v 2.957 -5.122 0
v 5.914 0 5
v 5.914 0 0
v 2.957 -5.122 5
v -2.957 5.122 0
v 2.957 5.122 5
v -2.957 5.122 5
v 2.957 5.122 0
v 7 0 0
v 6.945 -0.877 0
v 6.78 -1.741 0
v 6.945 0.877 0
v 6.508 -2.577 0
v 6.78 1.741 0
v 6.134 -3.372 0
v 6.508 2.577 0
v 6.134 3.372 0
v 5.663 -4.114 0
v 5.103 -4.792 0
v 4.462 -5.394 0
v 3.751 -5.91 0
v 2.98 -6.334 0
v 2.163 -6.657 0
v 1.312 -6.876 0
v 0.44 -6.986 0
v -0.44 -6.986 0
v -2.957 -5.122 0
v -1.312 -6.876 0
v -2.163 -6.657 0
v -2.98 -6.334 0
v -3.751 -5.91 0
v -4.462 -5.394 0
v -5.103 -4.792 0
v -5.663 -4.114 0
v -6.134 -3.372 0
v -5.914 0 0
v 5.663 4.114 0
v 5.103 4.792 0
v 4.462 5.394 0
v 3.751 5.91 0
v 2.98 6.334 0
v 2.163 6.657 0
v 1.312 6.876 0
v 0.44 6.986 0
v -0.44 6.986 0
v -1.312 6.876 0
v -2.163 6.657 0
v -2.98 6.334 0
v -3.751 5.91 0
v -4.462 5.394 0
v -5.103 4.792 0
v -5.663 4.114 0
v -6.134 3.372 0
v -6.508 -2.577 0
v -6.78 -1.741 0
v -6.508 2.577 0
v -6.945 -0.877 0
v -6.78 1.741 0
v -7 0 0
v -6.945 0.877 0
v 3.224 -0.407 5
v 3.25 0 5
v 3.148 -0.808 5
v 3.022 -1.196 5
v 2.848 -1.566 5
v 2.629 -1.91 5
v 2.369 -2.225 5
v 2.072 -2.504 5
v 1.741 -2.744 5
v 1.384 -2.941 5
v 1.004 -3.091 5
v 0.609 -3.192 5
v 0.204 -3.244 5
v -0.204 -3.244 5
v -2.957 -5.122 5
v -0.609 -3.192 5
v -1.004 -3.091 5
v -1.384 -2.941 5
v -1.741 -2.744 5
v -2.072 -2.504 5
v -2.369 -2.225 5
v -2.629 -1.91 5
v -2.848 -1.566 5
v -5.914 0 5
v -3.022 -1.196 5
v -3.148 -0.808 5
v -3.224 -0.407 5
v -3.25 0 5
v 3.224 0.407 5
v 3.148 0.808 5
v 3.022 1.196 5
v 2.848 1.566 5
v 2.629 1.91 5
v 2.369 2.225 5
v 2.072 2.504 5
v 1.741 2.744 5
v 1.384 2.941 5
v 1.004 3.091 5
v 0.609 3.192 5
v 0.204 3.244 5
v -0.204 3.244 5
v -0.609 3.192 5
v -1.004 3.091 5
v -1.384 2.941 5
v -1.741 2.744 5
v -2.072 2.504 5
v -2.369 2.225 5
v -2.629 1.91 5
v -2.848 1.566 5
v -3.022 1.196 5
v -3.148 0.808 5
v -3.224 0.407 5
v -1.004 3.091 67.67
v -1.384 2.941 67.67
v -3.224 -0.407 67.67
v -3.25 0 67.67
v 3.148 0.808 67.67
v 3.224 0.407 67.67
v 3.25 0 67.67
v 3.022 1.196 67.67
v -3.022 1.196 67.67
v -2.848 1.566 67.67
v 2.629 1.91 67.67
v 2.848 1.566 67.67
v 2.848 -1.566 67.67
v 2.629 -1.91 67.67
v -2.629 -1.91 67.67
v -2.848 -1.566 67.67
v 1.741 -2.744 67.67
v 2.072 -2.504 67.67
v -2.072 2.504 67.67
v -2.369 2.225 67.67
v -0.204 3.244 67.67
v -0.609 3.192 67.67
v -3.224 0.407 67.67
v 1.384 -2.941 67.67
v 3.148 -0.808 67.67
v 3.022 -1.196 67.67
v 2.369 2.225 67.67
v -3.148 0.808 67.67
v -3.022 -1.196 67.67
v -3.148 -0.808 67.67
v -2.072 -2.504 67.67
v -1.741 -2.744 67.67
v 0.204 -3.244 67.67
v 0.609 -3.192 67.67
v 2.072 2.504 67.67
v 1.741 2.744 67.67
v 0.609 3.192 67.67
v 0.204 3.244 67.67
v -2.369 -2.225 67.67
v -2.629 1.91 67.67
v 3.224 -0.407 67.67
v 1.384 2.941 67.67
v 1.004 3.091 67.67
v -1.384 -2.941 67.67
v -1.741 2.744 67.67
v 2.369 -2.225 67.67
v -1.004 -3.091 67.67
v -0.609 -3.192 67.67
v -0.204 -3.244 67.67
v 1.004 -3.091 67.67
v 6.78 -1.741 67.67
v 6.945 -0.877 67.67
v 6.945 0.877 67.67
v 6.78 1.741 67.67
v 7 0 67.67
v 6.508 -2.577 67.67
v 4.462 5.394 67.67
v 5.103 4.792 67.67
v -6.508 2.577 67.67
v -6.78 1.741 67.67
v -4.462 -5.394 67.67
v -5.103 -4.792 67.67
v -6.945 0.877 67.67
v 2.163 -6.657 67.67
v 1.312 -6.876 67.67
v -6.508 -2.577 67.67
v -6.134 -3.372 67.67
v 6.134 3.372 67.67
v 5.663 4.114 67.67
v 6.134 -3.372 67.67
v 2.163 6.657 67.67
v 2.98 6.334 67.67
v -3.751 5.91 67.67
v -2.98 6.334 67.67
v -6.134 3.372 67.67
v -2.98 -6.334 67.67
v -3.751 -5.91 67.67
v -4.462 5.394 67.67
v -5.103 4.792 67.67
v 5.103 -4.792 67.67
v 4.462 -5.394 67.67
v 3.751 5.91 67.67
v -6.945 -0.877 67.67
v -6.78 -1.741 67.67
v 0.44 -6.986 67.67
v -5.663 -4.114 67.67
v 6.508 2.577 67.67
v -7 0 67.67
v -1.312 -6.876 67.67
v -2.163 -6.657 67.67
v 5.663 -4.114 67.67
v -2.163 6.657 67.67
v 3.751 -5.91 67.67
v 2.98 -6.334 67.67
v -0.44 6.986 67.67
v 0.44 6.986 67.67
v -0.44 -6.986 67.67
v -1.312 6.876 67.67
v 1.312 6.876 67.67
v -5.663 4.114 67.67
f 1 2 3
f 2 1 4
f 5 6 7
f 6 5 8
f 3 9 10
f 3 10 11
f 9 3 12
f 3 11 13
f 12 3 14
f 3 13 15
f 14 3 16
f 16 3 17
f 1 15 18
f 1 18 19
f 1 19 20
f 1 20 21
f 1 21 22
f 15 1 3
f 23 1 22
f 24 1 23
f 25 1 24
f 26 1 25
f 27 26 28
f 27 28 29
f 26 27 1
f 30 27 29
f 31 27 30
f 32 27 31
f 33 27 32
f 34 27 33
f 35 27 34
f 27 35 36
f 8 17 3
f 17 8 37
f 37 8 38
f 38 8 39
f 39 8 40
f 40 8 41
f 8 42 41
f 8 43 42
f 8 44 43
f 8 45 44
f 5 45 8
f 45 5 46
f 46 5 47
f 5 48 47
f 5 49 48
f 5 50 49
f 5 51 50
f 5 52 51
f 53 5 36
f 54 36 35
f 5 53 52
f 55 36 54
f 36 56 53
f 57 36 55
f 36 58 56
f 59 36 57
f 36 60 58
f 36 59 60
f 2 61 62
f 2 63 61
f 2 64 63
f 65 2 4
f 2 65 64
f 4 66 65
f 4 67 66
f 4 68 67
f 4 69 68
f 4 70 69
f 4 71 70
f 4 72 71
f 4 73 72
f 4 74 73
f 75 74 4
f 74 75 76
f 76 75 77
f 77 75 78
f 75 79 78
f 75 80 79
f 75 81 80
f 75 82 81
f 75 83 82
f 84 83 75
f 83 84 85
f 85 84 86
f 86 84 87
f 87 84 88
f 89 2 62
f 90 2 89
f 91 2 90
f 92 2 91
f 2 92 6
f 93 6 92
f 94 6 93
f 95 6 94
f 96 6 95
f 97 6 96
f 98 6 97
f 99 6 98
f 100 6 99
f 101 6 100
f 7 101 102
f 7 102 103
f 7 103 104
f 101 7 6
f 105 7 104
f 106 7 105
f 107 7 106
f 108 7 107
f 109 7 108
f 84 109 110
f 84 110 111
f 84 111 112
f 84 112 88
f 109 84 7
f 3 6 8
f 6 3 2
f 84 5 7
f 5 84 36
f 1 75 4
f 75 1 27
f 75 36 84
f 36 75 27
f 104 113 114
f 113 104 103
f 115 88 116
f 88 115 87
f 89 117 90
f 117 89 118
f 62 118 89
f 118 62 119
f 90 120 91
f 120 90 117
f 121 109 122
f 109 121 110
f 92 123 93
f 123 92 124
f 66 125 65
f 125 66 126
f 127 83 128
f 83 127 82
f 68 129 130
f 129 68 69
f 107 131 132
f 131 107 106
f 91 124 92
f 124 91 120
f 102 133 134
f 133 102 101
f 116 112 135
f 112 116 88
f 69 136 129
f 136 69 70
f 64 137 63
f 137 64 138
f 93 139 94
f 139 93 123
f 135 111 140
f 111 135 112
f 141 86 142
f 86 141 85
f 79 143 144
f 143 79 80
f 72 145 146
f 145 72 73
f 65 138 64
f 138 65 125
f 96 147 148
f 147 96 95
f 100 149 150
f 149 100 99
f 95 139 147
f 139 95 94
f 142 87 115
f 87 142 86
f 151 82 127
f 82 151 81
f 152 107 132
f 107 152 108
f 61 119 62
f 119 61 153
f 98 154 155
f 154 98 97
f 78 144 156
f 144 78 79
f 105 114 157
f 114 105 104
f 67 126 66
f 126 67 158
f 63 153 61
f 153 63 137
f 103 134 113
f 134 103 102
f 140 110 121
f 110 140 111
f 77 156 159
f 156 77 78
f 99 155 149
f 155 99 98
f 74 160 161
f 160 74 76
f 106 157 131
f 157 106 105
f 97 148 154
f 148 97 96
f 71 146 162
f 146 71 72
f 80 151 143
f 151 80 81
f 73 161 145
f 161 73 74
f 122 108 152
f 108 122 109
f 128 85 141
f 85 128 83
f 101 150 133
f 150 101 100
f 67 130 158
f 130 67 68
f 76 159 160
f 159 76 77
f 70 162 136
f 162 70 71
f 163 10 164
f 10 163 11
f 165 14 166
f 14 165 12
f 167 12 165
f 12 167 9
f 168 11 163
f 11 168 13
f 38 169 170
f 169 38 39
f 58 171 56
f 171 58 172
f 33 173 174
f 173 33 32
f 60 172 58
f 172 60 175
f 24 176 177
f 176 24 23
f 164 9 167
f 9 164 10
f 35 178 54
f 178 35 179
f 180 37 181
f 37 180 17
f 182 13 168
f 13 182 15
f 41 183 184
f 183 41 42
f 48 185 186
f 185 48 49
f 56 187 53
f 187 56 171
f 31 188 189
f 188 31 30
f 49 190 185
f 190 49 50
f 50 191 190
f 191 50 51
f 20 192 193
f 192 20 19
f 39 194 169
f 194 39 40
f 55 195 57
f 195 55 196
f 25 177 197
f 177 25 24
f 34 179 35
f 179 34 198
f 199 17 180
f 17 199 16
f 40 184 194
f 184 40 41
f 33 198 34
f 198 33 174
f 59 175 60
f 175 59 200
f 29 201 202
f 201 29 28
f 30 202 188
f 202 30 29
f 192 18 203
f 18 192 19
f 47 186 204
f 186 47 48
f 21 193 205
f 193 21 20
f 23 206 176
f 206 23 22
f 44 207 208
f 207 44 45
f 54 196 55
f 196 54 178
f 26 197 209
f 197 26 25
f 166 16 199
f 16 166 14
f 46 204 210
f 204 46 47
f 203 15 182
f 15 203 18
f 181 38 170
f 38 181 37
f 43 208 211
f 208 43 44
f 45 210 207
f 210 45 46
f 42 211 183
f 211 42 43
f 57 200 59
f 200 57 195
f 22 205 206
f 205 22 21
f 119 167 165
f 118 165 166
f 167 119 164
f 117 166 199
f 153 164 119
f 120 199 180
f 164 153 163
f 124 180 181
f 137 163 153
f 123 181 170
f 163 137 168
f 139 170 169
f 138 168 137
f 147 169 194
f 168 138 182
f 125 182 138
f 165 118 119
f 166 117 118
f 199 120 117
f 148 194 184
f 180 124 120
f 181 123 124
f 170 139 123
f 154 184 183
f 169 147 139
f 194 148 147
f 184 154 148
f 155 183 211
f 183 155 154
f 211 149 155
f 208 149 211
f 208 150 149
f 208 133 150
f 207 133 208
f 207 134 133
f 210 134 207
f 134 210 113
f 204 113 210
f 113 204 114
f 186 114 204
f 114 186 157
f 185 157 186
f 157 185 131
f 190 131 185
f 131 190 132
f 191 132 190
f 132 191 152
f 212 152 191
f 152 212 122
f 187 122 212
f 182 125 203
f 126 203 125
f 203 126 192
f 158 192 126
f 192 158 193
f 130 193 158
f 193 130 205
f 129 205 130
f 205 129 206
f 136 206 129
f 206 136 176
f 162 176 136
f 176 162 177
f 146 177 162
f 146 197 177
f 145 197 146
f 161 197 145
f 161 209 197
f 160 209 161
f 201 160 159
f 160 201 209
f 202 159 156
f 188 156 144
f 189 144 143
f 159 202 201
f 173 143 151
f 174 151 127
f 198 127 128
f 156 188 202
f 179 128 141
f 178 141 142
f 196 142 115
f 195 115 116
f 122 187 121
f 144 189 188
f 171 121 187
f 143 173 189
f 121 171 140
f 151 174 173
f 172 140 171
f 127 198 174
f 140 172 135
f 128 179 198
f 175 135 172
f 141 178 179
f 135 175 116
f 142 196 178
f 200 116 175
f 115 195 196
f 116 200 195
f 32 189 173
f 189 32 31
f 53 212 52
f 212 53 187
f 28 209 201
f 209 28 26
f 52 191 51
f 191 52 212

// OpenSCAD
$fn = 50;


difference() {
	union() {
		cylinder(h = 67.6700000000, r = 7.0000000000);
	}
	union() {
		translate(v = [0, 0, 0]) {
			rotate(a = [0, 0, 0]) {
				difference() {
					union() {
						#linear_extrude(height = 5) {
							polygon(points = [[5.9142500000, 0.0000000000], [2.9571250000, 5.1218907443], [-2.9571250000, 5.1218907443], [-5.9142500000, 0.0000000000], [-2.9571250000, -5.1218907443], [2.9571250000, -5.1218907443]]);
						}
					}
					union();
				}
			}
		}
		translate(v = [0, 0, -100]) {
			cylinder(h = 200, r = 3.2500000000);
		}
		translate(v = [0, 0, -100]) {
			cylinder(h = 200, r = 1.8000000000);
		}
	}
}
